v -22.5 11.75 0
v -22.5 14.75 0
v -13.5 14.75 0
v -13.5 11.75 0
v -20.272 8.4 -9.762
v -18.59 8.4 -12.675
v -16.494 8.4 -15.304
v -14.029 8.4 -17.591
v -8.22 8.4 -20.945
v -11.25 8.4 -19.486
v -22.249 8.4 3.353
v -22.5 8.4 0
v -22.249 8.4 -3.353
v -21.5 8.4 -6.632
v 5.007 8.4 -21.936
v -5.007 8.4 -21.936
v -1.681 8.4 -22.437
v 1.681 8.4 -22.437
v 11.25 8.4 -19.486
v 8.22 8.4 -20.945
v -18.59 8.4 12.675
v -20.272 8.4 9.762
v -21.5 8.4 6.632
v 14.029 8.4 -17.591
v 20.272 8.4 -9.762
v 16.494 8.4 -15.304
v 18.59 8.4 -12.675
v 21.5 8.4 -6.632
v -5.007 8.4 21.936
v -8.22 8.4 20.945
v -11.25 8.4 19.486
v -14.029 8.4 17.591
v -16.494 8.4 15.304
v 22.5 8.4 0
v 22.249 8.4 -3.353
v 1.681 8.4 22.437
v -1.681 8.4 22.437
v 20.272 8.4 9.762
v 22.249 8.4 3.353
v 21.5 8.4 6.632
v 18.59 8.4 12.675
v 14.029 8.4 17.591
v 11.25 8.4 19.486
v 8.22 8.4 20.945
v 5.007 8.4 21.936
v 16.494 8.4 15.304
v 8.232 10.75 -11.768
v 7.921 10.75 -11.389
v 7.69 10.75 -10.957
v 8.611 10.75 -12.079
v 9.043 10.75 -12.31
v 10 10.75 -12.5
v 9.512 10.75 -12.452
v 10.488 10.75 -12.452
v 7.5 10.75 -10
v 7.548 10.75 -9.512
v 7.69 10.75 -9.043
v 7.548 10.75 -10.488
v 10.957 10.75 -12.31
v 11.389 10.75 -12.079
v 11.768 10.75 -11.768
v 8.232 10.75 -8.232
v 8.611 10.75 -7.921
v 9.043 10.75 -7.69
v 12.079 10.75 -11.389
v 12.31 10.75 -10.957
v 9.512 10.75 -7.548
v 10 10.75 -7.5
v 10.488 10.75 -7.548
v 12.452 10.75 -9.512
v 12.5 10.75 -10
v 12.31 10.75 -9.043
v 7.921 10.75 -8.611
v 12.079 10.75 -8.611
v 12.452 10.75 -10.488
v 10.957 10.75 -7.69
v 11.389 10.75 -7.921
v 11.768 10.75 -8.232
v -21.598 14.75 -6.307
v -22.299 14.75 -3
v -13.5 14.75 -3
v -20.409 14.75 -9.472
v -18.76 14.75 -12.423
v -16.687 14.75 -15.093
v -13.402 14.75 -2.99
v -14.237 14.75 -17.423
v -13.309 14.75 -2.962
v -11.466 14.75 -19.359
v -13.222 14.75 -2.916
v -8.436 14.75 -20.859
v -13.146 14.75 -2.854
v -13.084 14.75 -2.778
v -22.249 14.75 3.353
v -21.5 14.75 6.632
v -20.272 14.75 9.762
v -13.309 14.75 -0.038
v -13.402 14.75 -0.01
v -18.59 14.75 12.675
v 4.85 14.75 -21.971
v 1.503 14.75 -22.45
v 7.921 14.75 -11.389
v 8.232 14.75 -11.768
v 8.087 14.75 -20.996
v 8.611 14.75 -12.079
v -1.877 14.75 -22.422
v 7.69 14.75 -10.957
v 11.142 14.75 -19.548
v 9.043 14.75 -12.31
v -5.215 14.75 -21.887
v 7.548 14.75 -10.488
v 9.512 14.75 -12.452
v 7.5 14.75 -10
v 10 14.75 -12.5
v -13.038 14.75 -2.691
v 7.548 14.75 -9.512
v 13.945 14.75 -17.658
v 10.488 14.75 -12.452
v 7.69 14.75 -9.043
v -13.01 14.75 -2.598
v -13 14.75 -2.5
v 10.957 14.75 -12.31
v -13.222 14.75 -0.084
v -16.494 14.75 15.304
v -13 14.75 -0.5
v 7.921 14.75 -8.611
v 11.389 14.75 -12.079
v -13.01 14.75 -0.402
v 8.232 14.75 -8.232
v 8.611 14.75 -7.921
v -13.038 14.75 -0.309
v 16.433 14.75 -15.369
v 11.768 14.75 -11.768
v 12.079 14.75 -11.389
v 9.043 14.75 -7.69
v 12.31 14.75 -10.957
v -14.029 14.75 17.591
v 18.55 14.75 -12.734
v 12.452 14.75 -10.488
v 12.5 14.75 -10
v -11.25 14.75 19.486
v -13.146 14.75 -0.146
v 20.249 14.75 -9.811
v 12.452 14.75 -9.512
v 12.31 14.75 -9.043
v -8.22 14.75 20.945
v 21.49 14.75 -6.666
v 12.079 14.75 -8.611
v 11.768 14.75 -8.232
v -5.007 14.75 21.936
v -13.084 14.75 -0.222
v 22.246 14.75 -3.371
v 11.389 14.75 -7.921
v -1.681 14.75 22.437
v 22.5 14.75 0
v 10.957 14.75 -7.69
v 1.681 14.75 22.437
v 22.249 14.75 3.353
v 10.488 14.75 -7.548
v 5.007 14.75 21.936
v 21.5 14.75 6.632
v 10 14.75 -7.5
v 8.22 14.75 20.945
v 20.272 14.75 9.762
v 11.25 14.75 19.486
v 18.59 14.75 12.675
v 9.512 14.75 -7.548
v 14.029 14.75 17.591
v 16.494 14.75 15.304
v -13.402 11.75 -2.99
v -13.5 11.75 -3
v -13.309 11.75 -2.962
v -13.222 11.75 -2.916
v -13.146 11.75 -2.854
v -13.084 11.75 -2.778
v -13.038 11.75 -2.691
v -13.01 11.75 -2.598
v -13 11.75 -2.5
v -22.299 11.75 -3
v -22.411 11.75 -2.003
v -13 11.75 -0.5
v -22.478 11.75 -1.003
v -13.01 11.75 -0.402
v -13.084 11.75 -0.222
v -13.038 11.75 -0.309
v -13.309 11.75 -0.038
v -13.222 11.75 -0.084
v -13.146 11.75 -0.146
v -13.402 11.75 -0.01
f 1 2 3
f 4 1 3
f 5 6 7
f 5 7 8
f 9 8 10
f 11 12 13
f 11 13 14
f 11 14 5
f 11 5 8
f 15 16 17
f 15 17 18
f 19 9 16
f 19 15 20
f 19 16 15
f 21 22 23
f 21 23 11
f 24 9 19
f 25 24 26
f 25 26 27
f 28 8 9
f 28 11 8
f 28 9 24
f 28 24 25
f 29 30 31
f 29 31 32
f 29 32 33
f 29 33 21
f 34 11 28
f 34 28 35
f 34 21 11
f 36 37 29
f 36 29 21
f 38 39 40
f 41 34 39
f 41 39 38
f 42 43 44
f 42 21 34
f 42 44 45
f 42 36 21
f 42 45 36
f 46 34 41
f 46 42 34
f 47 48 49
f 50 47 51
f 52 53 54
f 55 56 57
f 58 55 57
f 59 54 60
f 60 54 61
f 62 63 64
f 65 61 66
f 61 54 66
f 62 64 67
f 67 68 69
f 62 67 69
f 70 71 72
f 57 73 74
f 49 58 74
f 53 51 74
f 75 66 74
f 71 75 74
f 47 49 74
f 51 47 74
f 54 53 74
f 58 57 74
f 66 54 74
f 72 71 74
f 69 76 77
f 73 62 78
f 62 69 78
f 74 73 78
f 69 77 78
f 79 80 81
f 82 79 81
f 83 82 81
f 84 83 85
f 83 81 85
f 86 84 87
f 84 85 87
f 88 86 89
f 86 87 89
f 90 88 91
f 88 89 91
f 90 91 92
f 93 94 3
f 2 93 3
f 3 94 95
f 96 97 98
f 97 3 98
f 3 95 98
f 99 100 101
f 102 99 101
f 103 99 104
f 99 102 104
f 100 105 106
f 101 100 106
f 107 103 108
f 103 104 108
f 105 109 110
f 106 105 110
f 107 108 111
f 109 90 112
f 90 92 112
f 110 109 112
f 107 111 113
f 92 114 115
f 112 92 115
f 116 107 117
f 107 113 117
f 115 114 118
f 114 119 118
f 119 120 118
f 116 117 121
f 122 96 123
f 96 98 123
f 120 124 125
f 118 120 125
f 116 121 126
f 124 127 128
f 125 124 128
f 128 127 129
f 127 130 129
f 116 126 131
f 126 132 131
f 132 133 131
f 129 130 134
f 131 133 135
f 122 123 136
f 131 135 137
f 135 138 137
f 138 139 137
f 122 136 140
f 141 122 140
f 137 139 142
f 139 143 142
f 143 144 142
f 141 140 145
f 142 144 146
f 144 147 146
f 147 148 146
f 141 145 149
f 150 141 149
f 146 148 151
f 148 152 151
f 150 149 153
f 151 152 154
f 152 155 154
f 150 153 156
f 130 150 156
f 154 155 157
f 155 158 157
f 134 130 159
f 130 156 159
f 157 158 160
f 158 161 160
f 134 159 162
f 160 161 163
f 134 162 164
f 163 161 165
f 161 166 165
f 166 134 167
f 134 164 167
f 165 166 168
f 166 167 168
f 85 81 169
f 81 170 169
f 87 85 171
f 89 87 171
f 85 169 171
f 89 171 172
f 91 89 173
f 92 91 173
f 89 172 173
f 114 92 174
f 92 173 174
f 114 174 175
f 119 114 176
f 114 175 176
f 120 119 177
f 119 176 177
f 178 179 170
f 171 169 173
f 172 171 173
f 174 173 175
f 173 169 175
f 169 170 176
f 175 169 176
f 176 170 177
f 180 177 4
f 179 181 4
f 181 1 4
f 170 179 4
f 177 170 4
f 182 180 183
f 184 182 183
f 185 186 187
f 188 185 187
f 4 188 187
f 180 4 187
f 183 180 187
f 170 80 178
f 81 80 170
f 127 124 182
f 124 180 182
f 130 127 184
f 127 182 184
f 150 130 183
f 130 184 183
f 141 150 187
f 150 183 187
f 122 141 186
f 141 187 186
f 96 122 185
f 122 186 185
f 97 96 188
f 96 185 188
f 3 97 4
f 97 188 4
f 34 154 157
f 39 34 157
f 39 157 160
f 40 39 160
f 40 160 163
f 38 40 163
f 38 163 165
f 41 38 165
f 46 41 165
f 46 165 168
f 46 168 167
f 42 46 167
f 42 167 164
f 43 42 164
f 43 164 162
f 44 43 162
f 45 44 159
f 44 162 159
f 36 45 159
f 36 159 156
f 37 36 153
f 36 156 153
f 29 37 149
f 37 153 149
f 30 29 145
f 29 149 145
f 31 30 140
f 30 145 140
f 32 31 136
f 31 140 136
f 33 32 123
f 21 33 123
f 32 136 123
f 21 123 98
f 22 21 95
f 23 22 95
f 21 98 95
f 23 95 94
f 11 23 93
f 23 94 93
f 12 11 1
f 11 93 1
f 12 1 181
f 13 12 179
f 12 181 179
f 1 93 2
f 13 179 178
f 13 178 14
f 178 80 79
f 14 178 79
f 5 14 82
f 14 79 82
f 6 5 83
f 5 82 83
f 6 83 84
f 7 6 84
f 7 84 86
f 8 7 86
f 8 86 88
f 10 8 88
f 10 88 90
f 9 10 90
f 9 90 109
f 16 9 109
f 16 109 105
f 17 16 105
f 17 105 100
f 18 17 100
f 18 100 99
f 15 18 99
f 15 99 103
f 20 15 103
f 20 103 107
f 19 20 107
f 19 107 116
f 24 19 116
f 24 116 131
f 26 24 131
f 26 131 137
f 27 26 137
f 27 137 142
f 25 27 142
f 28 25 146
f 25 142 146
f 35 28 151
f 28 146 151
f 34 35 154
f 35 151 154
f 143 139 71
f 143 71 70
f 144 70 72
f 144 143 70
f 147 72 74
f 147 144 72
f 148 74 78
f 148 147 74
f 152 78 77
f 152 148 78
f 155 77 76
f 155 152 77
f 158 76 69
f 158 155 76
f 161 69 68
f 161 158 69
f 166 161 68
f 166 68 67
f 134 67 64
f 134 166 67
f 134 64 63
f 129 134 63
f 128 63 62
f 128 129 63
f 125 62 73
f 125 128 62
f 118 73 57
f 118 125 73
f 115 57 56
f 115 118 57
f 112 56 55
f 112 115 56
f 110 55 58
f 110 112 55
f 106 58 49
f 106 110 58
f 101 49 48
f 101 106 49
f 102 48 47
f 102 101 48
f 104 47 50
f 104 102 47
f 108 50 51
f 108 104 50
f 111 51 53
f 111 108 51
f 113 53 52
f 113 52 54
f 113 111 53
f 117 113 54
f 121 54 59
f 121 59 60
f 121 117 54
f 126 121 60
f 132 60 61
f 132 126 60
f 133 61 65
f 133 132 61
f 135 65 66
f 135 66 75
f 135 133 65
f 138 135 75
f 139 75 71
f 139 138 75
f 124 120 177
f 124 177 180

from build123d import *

# Parameters (mm, degrees)
SKETCH058_W  = 10
SKETCH058_H  = 3
PAD058_DEPTH = 3
FILLET_R     = 0.5
FILLET001_R  = 0.5
SKETCH057_R  = 2.5
PAD057_DEPTH = 4
SKETCH056_R  = 22.5
PAD056_DEPTH = 6.35


with BuildPart() as fillet001:
    # Sketch058 → Pad058 (new body)
    with BuildSketch(Plane.XZ):
        with Locations((5, -1.5)):
            Rectangle(SKETCH058_W, SKETCH058_H)
    extrude(amount=PAD058_DEPTH)

    # Fillet
    fillet_edges = [fillet001.edges().sort_by_distance(p)[0] for p in [
        (10, -1.5, -3),
    ]]
    fillet(fillet_edges, radius=FILLET_R)

    # Fillet001
    fillet001_edges = [fillet001.edges().sort_by_distance(p)[0] for p in [
        (10, -1.5, 0),
    ]]
    fillet(fillet001_edges, radius=FILLET001_R)


with BuildPart() as fillet001_1:
    # Fillet001 placement: moved
    add(fillet001.part.moved(Location((-23, 0, 0))))


with BuildPart() as body057:
    # Sketch057 → Pad057 (new body)
    with BuildSketch(Plane.XZ):
        Circle(SKETCH057_R)
    extrude(amount=PAD057_DEPTH)


with BuildPart() as body057_1:
    # Body057 placement: moved
    add(body057.part.moved(Location((10, 0, -10))))


with BuildPart() as ledplate:
    # Sketch056 → Pad056 (new body)
    with BuildSketch(Plane.XZ):
        Circle(SKETCH056_R)
    extrude(amount=PAD056_DEPTH)

    # Cut061: cut Body057
    add(body057_1.part, mode=Mode.SUBTRACT)

    # Cut062: cut Fillet001
    add(fillet001_1.part, mode=Mode.SUBTRACT)


with BuildPart() as ledplate_1:
    # Cut062 placement: moved
    add(ledplate.part.moved(Location((0, 14.75, 0))))


solid = ledplate_1.part
